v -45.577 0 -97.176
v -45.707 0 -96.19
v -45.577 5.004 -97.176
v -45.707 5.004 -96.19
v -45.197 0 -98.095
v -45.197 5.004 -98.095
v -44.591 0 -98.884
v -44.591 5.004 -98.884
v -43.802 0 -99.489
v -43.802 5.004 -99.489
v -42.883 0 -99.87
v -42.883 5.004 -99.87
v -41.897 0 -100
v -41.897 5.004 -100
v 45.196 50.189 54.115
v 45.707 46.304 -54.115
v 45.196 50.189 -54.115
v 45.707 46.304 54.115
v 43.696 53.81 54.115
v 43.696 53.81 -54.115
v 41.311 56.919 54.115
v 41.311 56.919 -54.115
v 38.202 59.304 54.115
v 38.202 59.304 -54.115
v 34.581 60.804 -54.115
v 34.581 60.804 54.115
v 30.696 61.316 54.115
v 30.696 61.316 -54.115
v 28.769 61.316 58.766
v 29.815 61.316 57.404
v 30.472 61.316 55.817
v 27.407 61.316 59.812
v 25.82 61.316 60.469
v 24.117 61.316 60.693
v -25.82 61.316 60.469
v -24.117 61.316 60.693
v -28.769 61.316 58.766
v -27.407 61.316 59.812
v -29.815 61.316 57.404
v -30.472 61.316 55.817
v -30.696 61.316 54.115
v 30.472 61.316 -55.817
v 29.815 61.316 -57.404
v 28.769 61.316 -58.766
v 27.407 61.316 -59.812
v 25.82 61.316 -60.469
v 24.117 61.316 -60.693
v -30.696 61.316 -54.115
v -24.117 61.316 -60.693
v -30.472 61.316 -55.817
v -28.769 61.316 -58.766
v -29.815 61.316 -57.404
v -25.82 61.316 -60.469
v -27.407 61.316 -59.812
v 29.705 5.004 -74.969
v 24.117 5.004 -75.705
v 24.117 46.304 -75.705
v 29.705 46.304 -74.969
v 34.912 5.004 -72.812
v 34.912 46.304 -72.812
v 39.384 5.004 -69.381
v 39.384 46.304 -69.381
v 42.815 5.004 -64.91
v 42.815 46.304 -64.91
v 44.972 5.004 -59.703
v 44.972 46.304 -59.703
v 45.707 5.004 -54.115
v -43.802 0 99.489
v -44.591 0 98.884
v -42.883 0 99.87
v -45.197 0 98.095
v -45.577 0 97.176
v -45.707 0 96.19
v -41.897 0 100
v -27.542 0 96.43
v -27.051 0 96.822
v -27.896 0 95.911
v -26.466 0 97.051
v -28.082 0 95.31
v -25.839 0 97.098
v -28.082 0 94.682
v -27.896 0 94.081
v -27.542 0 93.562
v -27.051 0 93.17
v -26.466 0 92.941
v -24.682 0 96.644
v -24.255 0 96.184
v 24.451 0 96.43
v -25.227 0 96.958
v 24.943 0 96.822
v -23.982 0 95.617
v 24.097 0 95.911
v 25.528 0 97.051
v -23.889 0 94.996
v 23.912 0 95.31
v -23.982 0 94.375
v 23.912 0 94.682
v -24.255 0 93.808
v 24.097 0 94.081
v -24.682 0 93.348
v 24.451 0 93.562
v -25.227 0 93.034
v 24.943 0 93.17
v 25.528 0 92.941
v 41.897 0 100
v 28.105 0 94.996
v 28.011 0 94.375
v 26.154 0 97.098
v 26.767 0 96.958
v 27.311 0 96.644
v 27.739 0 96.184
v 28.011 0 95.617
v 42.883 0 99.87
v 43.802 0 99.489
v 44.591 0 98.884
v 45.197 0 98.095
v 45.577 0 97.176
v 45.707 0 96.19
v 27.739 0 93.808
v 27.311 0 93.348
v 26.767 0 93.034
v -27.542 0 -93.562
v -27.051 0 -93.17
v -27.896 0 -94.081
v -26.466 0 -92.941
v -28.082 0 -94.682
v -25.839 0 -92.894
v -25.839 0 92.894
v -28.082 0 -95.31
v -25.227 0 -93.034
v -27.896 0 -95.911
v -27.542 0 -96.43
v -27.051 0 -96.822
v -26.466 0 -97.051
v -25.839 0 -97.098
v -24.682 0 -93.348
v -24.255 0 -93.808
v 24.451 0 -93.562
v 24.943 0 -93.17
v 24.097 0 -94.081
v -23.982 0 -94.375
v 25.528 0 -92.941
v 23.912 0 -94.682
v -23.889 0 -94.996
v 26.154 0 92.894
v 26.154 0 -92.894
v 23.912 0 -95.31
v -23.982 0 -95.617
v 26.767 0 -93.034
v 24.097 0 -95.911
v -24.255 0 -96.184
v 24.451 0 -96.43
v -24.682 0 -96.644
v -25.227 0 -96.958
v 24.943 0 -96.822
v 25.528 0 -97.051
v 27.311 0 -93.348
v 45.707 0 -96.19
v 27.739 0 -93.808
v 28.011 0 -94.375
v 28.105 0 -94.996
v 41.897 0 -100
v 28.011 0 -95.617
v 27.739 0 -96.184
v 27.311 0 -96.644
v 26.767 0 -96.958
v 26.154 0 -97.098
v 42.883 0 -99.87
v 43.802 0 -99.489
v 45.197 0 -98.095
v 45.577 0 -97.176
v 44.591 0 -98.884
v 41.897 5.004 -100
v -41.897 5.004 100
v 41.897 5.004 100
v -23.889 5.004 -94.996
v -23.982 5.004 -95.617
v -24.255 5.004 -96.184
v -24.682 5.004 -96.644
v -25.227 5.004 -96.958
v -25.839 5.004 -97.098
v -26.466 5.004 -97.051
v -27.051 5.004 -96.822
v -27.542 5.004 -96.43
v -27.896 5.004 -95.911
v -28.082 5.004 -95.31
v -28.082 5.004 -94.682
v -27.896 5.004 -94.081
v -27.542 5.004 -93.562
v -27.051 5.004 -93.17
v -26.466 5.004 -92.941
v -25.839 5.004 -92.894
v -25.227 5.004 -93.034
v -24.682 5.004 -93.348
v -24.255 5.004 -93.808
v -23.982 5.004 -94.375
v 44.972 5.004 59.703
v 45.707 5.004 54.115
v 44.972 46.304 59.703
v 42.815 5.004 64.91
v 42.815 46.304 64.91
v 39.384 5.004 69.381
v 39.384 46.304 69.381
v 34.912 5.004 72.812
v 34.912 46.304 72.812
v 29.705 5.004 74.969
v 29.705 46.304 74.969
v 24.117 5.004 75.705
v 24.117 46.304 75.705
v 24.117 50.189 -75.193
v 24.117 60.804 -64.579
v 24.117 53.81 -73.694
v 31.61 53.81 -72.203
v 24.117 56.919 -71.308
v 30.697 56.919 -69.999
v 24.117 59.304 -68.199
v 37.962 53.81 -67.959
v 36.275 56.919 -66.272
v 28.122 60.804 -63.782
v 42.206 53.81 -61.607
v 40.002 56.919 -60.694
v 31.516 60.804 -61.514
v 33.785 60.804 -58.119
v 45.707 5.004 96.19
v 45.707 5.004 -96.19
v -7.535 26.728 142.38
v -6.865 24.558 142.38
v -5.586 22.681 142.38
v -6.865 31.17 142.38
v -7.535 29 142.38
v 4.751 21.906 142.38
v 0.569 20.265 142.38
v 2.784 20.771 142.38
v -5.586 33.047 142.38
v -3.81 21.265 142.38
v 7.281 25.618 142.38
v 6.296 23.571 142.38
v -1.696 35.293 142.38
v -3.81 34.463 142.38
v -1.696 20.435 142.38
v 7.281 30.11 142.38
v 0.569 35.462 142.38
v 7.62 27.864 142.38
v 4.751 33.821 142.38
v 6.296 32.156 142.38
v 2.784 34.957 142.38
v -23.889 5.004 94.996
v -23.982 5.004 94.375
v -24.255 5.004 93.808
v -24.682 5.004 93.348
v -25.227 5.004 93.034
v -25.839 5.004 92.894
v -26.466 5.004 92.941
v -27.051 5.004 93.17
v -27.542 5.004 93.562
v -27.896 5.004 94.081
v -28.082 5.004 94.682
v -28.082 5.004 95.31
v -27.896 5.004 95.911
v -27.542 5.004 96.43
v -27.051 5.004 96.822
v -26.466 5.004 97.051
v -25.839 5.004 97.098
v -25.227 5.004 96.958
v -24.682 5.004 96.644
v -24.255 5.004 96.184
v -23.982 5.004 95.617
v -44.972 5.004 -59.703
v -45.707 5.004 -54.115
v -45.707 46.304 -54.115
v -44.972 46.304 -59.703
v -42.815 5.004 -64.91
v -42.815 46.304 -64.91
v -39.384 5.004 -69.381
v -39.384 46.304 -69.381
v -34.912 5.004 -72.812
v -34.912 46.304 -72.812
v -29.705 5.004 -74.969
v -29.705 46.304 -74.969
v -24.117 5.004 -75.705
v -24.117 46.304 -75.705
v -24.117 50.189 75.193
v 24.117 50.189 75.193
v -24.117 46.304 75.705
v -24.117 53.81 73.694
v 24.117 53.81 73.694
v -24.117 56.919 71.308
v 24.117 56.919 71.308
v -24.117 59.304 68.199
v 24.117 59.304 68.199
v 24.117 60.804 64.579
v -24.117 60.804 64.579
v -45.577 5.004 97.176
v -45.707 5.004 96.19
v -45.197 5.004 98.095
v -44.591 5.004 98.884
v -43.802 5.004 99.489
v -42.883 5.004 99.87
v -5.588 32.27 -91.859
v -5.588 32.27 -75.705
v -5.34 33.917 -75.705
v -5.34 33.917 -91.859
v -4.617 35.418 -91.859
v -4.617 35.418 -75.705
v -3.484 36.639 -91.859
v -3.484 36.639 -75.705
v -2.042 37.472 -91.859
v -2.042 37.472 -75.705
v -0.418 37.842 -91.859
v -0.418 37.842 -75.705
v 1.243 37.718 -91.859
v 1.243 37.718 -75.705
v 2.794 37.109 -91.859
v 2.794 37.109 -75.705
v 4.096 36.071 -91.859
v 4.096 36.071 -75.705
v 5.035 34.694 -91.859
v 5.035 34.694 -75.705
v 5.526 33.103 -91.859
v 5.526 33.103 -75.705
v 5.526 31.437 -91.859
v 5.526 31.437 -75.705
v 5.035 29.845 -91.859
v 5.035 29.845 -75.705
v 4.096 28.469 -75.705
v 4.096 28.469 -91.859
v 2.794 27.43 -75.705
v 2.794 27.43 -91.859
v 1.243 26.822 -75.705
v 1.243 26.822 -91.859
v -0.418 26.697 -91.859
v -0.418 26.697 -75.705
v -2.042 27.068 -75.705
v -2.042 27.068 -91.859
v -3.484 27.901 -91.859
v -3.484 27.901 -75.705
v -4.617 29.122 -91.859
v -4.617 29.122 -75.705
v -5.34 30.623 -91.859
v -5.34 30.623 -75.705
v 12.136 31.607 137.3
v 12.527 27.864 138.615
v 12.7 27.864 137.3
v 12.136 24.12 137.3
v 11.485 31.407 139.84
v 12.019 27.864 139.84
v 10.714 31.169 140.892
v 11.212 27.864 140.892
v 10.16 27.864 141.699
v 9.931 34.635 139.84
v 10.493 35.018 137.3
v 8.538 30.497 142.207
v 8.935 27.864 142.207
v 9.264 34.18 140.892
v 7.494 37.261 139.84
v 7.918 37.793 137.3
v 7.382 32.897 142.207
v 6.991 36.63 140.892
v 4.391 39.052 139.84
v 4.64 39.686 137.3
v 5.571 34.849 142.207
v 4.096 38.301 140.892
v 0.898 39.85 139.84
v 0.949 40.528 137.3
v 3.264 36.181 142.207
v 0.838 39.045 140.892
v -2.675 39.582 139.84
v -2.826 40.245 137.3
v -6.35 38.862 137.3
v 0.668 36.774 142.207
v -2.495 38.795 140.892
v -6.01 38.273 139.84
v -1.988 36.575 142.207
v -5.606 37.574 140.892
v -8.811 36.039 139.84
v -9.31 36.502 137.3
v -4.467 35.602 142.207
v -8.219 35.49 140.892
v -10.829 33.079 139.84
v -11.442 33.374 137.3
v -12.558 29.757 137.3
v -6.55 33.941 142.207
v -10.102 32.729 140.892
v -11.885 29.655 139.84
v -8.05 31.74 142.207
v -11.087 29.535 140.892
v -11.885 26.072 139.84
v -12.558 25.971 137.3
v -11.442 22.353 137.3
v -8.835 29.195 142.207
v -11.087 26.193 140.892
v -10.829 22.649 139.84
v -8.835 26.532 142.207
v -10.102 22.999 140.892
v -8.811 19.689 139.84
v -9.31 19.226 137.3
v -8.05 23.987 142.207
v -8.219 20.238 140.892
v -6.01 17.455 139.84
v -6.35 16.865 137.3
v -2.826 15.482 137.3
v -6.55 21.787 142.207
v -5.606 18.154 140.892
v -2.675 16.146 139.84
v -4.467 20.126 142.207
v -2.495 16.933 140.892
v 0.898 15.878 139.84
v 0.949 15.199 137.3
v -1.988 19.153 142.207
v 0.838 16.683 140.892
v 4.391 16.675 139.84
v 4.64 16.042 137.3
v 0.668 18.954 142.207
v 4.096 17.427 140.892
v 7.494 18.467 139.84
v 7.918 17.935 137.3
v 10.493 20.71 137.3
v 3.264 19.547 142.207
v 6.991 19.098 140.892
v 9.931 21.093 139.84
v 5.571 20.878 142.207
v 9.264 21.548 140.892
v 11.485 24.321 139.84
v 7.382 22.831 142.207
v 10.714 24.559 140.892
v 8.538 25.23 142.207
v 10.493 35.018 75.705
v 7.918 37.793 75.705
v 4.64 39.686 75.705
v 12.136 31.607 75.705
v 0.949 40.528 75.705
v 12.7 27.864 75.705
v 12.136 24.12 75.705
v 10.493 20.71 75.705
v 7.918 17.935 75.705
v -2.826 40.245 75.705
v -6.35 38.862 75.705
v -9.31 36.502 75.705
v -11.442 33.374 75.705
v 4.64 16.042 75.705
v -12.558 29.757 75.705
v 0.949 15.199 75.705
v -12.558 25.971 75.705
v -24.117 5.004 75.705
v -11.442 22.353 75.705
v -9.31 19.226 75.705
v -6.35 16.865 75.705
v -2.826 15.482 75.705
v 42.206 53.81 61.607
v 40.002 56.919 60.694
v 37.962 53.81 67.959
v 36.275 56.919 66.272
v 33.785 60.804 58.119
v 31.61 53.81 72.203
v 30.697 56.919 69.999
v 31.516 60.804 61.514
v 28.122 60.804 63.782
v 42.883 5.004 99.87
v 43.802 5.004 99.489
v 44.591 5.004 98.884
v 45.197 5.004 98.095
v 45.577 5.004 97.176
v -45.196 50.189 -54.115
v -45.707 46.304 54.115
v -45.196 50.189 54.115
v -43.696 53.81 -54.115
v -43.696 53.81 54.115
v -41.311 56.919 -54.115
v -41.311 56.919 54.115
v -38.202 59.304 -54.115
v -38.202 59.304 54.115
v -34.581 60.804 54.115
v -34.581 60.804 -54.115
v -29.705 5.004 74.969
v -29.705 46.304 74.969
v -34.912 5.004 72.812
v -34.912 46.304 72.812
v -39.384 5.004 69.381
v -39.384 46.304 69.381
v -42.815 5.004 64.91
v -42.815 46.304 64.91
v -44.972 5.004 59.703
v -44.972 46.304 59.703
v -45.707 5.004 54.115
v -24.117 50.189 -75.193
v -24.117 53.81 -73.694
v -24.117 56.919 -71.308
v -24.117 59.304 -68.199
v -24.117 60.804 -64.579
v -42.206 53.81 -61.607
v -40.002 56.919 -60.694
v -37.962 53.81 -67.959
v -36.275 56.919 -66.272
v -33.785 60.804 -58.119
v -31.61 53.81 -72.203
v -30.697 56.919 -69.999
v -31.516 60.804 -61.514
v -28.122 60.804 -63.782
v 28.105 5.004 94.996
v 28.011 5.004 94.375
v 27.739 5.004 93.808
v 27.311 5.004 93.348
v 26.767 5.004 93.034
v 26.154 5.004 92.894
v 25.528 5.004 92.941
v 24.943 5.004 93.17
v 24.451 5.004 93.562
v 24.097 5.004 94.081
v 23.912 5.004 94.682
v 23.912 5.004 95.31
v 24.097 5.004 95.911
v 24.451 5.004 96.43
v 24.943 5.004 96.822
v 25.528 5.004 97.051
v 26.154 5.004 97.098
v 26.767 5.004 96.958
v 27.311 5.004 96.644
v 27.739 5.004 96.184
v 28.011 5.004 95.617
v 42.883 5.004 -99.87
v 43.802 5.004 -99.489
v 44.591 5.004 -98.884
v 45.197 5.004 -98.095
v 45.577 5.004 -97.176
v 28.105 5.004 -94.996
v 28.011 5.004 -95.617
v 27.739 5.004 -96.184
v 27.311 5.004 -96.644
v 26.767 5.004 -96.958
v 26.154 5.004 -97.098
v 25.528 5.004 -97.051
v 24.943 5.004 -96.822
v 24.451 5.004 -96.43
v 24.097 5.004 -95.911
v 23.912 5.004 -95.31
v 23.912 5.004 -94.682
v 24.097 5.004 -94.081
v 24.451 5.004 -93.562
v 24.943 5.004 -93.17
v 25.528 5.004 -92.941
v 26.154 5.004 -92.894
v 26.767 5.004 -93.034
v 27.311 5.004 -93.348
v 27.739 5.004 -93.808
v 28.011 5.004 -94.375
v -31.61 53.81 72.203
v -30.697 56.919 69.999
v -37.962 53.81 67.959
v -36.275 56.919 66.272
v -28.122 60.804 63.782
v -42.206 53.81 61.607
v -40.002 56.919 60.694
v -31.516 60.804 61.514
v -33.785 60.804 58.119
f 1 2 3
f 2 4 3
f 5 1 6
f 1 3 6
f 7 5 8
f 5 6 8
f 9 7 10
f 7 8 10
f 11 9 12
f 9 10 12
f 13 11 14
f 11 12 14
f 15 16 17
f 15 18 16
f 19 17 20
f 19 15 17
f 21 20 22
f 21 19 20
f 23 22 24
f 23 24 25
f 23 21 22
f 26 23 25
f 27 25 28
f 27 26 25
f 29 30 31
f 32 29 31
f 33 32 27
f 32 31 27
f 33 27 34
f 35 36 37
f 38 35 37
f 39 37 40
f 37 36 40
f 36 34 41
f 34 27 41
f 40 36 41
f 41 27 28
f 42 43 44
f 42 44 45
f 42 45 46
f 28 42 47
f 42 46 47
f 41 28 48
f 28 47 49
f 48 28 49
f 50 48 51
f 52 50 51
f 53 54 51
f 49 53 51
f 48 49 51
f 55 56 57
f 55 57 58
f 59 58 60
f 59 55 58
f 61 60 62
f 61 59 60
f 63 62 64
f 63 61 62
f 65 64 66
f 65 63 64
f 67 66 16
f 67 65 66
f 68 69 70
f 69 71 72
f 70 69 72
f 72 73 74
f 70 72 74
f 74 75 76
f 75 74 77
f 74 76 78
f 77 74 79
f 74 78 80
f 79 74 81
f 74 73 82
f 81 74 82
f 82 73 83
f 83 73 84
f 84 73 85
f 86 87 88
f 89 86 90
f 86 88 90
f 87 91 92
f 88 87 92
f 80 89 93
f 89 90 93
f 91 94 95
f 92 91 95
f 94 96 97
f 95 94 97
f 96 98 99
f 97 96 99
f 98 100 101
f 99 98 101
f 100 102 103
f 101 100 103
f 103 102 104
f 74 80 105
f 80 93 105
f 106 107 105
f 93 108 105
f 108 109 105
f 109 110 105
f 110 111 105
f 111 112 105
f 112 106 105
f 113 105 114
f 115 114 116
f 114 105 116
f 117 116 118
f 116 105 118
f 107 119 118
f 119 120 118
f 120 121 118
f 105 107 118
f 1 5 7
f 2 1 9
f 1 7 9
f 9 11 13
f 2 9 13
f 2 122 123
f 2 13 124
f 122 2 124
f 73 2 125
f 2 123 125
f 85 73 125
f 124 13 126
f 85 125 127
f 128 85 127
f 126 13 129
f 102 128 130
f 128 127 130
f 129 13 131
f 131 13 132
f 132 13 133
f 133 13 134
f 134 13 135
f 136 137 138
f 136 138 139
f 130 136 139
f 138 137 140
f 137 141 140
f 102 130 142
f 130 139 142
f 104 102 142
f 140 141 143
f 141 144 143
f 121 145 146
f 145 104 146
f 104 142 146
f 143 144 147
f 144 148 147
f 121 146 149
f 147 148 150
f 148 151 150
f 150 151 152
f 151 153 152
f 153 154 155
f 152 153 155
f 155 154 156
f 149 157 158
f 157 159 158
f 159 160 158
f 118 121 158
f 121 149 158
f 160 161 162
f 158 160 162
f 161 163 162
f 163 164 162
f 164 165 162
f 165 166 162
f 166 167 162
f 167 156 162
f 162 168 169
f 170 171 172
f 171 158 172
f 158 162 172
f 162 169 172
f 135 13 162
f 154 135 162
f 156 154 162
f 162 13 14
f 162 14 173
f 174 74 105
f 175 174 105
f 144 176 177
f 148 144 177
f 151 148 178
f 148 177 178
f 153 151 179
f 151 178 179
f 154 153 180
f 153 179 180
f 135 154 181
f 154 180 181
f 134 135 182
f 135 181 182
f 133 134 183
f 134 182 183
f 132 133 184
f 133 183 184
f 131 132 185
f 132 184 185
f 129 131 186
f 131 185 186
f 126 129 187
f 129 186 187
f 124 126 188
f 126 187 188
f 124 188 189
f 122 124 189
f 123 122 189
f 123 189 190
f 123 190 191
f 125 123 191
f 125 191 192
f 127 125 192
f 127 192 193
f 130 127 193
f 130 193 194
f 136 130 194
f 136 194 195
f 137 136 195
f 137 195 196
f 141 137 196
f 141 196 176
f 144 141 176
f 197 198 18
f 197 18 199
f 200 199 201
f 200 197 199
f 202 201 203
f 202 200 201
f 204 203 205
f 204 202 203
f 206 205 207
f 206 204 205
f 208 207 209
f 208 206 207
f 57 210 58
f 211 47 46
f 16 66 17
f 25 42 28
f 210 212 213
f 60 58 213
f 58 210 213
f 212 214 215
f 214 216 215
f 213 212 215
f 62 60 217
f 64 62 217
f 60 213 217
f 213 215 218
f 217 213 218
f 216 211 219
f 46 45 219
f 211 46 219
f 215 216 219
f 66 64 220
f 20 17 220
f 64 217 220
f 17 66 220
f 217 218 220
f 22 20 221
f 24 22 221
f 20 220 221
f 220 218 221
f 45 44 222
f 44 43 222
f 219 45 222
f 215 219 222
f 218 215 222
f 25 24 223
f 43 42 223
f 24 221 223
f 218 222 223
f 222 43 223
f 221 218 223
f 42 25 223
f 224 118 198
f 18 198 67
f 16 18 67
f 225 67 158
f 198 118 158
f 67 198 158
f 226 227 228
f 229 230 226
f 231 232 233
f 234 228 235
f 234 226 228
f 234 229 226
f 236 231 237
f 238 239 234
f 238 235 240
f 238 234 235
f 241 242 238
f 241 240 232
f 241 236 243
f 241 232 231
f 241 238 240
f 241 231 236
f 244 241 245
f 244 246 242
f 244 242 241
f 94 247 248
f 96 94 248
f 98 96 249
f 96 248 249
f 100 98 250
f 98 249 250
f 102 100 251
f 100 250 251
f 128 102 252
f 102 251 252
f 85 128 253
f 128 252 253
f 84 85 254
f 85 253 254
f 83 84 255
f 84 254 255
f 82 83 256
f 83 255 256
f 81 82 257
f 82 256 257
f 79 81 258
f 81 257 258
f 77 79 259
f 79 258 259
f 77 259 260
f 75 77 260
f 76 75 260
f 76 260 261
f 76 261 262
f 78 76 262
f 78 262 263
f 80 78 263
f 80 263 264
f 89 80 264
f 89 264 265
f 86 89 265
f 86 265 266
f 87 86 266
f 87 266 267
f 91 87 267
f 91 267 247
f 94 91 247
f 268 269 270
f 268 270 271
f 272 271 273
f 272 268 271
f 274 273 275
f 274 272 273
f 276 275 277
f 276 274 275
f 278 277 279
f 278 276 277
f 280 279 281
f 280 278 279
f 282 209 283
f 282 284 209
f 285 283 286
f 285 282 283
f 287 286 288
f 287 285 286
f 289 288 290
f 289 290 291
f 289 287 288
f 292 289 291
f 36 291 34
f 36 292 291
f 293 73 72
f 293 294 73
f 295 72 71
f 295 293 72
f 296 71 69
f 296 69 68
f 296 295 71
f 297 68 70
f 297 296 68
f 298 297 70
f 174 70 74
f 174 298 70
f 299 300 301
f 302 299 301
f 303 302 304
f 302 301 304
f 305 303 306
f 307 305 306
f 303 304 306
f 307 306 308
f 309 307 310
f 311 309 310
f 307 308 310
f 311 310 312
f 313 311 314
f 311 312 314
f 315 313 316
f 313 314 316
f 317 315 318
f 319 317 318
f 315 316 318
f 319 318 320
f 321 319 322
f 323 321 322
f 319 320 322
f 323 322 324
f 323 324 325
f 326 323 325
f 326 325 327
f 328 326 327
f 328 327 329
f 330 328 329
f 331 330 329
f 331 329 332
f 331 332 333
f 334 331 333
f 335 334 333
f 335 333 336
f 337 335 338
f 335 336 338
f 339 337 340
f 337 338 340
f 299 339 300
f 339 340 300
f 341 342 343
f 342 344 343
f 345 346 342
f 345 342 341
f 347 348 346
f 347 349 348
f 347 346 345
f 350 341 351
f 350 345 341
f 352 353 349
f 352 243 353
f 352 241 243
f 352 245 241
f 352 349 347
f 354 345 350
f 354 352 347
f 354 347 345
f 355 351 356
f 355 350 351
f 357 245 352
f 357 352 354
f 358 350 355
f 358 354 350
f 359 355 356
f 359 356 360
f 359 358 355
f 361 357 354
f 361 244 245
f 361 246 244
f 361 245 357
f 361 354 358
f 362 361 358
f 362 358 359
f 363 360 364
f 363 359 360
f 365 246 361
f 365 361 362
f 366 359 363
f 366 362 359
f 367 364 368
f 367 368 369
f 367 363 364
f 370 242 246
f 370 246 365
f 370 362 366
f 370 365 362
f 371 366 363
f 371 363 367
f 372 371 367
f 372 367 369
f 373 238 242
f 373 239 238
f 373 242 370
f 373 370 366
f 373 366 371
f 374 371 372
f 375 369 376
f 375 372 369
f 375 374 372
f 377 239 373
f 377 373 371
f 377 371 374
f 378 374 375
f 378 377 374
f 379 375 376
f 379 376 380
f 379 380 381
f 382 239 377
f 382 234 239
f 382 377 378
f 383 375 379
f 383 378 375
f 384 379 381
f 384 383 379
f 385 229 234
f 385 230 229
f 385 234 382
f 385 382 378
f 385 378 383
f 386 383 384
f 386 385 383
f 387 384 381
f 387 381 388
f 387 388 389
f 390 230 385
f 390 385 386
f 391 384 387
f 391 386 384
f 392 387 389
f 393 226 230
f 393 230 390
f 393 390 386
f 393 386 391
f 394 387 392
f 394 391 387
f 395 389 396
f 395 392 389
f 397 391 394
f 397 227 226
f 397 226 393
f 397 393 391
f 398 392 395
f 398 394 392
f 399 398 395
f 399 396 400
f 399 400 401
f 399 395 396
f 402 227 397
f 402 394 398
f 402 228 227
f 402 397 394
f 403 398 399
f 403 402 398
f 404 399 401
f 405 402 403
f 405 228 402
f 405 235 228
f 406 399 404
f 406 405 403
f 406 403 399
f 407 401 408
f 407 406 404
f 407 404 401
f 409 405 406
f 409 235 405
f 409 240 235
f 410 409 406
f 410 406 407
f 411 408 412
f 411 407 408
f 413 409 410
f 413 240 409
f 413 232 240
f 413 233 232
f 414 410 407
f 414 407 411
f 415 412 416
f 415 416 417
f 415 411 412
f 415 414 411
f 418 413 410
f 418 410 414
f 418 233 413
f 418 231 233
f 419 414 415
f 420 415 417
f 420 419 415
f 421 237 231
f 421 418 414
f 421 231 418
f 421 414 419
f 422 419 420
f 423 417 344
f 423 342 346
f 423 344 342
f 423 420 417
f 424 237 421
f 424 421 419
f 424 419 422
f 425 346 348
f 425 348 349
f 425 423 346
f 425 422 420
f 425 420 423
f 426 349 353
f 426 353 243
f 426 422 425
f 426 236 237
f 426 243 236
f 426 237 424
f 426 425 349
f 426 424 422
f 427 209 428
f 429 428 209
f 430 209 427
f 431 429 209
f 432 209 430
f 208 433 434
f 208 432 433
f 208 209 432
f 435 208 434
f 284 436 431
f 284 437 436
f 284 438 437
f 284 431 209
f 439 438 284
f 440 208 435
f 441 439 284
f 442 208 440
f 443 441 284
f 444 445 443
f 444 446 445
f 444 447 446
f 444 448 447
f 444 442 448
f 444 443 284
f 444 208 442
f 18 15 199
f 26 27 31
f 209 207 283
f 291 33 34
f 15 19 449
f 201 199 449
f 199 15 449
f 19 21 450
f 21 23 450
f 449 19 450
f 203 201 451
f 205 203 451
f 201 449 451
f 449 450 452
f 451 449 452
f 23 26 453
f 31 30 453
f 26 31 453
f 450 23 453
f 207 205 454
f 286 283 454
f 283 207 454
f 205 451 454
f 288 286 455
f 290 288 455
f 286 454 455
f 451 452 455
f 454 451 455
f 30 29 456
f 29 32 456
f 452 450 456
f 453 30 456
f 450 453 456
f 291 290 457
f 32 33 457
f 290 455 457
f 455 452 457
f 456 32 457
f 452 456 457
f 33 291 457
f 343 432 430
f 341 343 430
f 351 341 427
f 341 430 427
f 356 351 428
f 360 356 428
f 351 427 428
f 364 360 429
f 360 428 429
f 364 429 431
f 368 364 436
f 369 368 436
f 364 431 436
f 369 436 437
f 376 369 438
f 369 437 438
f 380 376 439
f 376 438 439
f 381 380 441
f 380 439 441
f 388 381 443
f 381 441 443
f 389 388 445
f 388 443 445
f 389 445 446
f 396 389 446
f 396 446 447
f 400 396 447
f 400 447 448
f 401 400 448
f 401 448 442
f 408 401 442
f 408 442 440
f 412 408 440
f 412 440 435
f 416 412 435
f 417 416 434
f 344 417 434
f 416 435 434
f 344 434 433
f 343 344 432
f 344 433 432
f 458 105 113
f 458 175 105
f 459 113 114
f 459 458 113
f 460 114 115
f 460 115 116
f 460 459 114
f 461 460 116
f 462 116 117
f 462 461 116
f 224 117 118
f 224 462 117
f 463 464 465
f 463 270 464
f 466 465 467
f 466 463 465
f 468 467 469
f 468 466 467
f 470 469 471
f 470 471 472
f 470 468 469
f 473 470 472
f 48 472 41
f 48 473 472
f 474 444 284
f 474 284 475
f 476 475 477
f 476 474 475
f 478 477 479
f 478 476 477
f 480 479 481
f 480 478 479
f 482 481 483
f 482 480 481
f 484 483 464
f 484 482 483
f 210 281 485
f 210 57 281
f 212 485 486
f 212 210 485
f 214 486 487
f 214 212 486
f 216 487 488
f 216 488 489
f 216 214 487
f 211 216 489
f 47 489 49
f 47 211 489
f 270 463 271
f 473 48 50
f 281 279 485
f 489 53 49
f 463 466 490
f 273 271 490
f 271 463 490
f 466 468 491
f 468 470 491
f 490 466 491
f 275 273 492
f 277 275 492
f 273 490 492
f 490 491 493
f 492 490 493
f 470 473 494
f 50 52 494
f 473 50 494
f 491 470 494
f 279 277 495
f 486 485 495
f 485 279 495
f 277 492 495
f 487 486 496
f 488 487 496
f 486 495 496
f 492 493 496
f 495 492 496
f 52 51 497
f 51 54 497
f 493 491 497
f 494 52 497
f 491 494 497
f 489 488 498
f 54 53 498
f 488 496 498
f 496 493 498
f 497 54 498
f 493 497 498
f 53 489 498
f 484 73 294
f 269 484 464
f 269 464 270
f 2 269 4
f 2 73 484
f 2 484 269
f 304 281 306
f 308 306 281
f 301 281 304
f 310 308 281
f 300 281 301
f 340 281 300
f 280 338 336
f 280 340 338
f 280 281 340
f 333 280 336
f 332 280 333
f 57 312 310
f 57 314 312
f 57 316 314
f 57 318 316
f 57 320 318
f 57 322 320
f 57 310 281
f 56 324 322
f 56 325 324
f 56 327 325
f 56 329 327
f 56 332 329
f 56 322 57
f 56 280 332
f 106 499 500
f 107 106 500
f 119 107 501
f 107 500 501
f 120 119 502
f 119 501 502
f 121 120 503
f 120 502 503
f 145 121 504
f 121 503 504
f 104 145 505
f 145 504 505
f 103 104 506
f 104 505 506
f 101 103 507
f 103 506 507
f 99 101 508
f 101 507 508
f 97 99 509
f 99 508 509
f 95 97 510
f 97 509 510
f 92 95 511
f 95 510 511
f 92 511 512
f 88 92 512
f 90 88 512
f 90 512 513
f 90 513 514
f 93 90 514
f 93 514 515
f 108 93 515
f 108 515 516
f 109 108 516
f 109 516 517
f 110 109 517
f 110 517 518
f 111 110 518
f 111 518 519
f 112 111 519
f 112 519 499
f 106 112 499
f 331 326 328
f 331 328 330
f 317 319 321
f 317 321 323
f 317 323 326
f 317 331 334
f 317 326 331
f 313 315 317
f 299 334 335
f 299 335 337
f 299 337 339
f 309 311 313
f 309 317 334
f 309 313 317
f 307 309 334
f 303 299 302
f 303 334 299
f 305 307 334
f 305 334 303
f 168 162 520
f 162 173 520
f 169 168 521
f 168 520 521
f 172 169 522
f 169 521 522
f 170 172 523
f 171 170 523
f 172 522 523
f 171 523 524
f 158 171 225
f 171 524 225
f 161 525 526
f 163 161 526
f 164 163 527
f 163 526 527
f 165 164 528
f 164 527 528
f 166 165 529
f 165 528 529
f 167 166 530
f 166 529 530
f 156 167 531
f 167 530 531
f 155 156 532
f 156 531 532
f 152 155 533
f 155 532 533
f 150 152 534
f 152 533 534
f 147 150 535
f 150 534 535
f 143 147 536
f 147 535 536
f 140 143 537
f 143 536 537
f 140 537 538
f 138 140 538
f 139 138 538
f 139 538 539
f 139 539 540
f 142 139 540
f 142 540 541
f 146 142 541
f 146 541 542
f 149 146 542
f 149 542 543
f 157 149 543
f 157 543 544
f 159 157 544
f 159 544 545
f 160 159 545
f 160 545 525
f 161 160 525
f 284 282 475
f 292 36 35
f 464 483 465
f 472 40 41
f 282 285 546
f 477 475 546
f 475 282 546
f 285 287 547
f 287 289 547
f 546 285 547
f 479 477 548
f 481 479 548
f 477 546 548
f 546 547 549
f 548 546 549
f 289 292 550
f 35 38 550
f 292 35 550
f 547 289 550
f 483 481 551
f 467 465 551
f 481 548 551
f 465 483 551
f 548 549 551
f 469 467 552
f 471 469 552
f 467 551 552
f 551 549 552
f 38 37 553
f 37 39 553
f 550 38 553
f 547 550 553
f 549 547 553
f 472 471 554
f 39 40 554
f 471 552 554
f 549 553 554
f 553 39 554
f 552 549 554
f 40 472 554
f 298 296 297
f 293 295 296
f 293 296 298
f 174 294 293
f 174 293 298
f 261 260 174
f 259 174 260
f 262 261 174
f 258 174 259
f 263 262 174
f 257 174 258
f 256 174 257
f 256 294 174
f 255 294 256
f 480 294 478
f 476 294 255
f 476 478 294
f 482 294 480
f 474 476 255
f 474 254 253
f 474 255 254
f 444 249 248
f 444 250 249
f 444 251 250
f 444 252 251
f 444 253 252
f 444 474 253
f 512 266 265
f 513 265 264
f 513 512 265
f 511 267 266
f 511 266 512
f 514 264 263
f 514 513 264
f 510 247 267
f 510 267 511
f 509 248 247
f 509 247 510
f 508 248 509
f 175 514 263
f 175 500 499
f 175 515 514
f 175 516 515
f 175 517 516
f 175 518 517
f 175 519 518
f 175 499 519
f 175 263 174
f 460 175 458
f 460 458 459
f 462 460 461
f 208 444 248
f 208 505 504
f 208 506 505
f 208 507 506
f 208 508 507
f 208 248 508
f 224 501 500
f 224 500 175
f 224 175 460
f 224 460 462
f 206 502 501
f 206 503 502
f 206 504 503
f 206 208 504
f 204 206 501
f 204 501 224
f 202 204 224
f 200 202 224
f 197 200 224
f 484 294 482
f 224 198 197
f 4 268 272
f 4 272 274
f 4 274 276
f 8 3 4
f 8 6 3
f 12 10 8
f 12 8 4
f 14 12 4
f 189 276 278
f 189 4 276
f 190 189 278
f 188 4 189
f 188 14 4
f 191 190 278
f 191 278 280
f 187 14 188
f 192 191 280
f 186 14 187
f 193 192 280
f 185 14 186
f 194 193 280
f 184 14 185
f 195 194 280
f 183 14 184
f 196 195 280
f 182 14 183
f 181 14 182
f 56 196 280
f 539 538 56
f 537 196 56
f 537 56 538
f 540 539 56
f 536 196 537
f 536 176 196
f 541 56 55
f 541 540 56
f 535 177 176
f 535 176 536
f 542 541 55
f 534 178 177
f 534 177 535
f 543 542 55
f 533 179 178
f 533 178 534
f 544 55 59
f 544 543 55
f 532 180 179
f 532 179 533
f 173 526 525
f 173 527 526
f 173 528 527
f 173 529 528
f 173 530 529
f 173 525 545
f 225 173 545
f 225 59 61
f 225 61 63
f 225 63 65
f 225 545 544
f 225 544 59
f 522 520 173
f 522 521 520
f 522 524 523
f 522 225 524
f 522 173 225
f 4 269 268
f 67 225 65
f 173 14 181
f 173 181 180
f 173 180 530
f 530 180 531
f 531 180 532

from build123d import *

# Parameters (mm, degrees)
SKETCH1_W           = 91.4146
SKETCH1_H           = 199.9996
BOSS_EXTRUDE1_DEPTH = 5.0038
BOSS_EXTRUDE2_DEPTH = 56.3118
FILLET1_R           = 15.0114
CUT_EXTRUDE1_REACH  = 7.004
SKETCH3_R           = 2.1082
FILLET2_R           = 3.81
SKETCH5_R           = 12.7
BOSS_EXTRUDE3_DEPTH = 66.675
FILLET3_R           = 5.08
SKETCH6_R           = 5.588
BOSS_EXTRUDE4_DEPTH = 16.1544


with BuildPart() as part:
    # Sketch1 → Boss-Extrude1 (new body)
    with BuildSketch(Plane(origin=(0, 0, 0), x_dir=(1, 0, 0), z_dir=(0, 1, 0))):
        Rectangle(SKETCH1_W, SKETCH1_H)
    extrude(amount=BOSS_EXTRUDE1_DEPTH)

    # Sketch2 → Boss-Extrude2 (add)
    with BuildSketch(Plane(origin=(0, 5.0038, 0), x_dir=(1, 0, 0), z_dir=(0, 1, 0))):
        with BuildLine():
            Line((-24.1173, 75.7047), (24.1173, 75.7047))
            ThreePointArc((24.1173, 75.7047), (39.383735406, 69.381135406), (45.7073, 54.1147))
            Line((45.7073, 54.1147), (45.7073, -54.1147))
            ThreePointArc((45.7073, -54.1147), (39.383735406, -69.381135406), (24.1173, -75.7047))
            Line((24.1173, -75.7047), (-24.1173, -75.7047))
            ThreePointArc((-24.1173, -75.7047), (-39.383735406, -69.381135406), (-45.7073, -54.1147))
            Line((-45.7073, -54.1147), (-45.7073, 54.1147))
            ThreePointArc((-45.7073, 54.1147), (-39.383735406, 69.381135406), (-24.1173, 75.7047))
        make_face()
    extrude(amount=BOSS_EXTRUDE2_DEPTH)

    # Fillet1
    fillet1_edges = [part.edges().sort_by_distance(p)[0] for p in [
        (-39.383735406, 61.3156, -69.381135406),
        (-45.7073, 61.3156, 0),
        (-39.383735406, 61.3156, 69.381135406),
        (0, 61.3156, 75.7047),
        (39.383735406, 61.3156, 69.381135406),
        (45.7073, 61.3156, 0),
        (39.383735406, 61.3156, -69.381135406),
        (0, 61.3156, -75.7047),
    ]]
    fillet(fillet1_edges, radius=FILLET1_R)

    # Sketch3 → Cut-Extrude1 (cut, up to next)
    with BuildSketch(Plane(origin=(0, 5.0038, 0), x_dir=(1, 0, 0), z_dir=(0, 1, 0)), mode=Mode.PRIVATE) as cut_extrude1_sk1:
        with Locations((25.9969, 94.996)):
            Circle(SKETCH3_R)
    cut_extrude1_tool1 = extrude(cut_extrude1_sk1.sketch, amount=-CUT_EXTRUDE1_REACH, mode=Mode.PRIVATE) & part.part
    add(cut_extrude1_tool1.solids().sort_by_distance((25.9969, 5.0038, -94.996))[0], mode=Mode.SUBTRACT)
    # Sketch3 → Cut-Extrude1 (cut, up to next)
    with BuildSketch(Plane(origin=(0, 5.0038, 0), x_dir=(1, 0, 0), z_dir=(0, 1, 0)), mode=Mode.PRIVATE) as cut_extrude1_sk2:
        with Locations((-25.9969, 94.996)):
            Circle(SKETCH3_R)
    cut_extrude1_tool2 = extrude(cut_extrude1_sk2.sketch, amount=-CUT_EXTRUDE1_REACH, mode=Mode.PRIVATE) & part.part
    add(cut_extrude1_tool2.solids().sort_by_distance((-25.9969, 5.0038, -94.996))[0], mode=Mode.SUBTRACT)
    # Sketch3 → Cut-Extrude1 (cut, up to next)
    with BuildSketch(Plane(origin=(0, 5.0038, 0), x_dir=(1, 0, 0), z_dir=(0, 1, 0)), mode=Mode.PRIVATE) as cut_extrude1_sk3:
        with Locations((25.9969, -94.996)):
            Circle(SKETCH3_R)
    cut_extrude1_tool3 = extrude(cut_extrude1_sk3.sketch, amount=-CUT_EXTRUDE1_REACH, mode=Mode.PRIVATE) & part.part
    add(cut_extrude1_tool3.solids().sort_by_distance((25.9969, 5.0038, 94.996))[0], mode=Mode.SUBTRACT)
    # Sketch3 → Cut-Extrude1 (cut, up to next)
    with BuildSketch(Plane(origin=(0, 5.0038, 0), x_dir=(1, 0, 0), z_dir=(0, 1, 0)), mode=Mode.PRIVATE) as cut_extrude1_sk4:
        with Locations((-25.9969, -94.996)):
            Circle(SKETCH3_R)
    cut_extrude1_tool4 = extrude(cut_extrude1_sk4.sketch, amount=-CUT_EXTRUDE1_REACH, mode=Mode.PRIVATE) & part.part
    add(cut_extrude1_tool4.solids().sort_by_distance((-25.9969, 5.0038, 94.996))[0], mode=Mode.SUBTRACT)

    # Fillet2
    fillet2_edges = [part.edges().sort_by_distance(p)[0] for p in [
        (45.7073, 2.5019, 99.9998),
        (-45.7073, 2.5019, 99.9998),
        (-45.7073, 2.5019, -99.9998),
        (45.7073, 2.5019, -99.9998),
    ]]
    fillet(fillet2_edges, radius=FILLET2_R)

    # Sketch5 → Boss-Extrude3 (add)
    with BuildSketch(Plane.XY.offset(75.7047)):
        with Locations((0, 27.8638)):
            Circle(SKETCH5_R)
    extrude(amount=BOSS_EXTRUDE3_DEPTH)

    # Fillet3
    fillet3_edges = [part.edges().sort_by_distance(p)[0] for p in [
        (-12.7, 27.8638, 142.3797),
    ]]
    fillet(fillet3_edges, radius=FILLET3_R)

    # Sketch6 → Boss-Extrude4 (add)
    with BuildSketch(Plane(origin=(0, 0, -75.7047), x_dir=(-1, 0, 0), z_dir=(0, 0, -1))):
        with Locations((0, 32.269838727)):
            Circle(SKETCH6_R)
    extrude(amount=BOSS_EXTRUDE4_DEPTH)


solid = part.part
